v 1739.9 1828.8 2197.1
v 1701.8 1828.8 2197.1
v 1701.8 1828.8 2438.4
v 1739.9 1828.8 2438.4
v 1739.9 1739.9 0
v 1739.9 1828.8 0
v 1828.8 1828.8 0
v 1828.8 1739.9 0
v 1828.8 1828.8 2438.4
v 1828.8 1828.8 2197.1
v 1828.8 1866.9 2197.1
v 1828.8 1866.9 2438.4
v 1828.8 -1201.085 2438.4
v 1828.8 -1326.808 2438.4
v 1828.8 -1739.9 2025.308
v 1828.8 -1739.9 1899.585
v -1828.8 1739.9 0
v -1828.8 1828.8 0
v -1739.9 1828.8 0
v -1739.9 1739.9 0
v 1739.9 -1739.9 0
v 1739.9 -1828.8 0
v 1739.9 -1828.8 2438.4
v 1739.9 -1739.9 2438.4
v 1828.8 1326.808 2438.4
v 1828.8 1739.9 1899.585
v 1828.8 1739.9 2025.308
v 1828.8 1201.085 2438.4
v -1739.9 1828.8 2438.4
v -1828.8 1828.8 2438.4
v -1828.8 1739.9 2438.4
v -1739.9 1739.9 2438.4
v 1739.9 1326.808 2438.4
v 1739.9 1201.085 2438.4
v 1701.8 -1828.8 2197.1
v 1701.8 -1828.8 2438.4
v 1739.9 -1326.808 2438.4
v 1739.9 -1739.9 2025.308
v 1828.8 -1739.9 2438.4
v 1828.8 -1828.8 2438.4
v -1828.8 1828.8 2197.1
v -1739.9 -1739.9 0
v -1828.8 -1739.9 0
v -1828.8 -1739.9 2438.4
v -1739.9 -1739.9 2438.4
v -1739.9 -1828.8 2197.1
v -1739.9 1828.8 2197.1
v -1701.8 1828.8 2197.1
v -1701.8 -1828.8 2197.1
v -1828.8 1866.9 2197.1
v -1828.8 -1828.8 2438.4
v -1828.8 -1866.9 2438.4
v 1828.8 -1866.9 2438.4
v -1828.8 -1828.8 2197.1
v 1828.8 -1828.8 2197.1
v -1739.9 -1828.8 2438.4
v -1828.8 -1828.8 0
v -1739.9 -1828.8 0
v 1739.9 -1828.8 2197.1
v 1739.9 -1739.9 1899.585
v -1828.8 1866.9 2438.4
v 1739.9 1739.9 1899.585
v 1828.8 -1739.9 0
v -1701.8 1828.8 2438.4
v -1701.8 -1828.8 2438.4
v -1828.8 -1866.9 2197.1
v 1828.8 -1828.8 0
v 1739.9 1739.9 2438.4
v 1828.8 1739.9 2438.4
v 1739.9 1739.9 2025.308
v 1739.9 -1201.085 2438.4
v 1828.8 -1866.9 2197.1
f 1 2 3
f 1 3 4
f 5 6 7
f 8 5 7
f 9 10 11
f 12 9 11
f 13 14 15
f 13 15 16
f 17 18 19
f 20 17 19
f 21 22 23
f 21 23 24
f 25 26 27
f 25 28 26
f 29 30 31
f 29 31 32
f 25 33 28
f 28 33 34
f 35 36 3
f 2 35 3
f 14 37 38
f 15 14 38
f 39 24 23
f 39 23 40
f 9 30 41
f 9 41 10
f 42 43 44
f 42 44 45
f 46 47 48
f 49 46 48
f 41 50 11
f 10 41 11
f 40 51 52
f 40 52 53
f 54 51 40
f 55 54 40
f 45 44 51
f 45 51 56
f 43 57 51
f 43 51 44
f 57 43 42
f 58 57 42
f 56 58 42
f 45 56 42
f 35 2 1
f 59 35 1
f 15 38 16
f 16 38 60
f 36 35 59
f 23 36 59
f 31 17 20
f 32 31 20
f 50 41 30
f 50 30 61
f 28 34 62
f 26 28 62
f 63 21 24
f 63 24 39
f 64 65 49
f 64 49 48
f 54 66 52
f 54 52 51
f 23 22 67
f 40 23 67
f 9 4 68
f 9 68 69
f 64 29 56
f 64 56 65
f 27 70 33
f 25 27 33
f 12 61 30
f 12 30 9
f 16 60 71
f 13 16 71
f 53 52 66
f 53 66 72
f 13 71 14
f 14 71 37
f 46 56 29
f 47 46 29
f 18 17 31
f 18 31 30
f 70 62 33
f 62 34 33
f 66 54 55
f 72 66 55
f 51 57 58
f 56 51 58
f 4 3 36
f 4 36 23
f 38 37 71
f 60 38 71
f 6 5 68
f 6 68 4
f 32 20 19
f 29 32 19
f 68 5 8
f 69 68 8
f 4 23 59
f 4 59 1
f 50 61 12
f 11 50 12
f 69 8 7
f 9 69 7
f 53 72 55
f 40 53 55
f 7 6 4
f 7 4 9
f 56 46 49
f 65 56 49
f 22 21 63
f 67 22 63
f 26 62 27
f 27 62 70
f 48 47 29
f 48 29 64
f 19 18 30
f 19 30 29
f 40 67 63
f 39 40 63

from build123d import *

# Parameters (mm, degrees)
F0_W     = 88.9
F0_H     = 88.9
F1_DEPTH = 2438.4
F2_W     = 38.1
F2_H     = 3657.6
F3_DEPTH = 241.3
F4_W     = 3657.6
F4_H     = 38.1
F5_DEPTH = 241.3
F7_DEPTH = 88.9


with BuildPart() as f1:
    # F0 (on Top) → F1 (new body)
    with BuildSketch(Plane.XY):
        with Locations((-1784.35, 1784.35)):
            Rectangle(F0_W, F0_H)
    extrude(amount=F1_DEPTH)


with BuildPart() as f1b:
    # F0 (on Top) → F1, piece 2 (new body)
    with BuildSketch(Plane.XY):
        with Locations((1784.35, 1784.35)):
            Rectangle(F0_W, F0_H)
    extrude(amount=F1_DEPTH)


with BuildPart() as f1c:
    # F0 (on Top) → F1, piece 3 (new body)
    with BuildSketch(Plane.XY):
        with Locations((1784.35, -1784.35)):
            Rectangle(F0_W, F0_H)
    extrude(amount=F1_DEPTH)


with BuildPart() as f1d:
    # F0 (on Top) → F1, piece 4 (new body)
    with BuildSketch(Plane.XY):
        with Locations((-1784.35, -1784.35)):
            Rectangle(F0_W, F0_H)
    extrude(amount=F1_DEPTH)


with BuildPart() as f3:
    # F2 (on face) → F3 (new body)
    with BuildSketch(Plane.XY.offset(2438.4)):
        with Locations((-1720.85, 0)):
            Rectangle(F2_W, F2_H)
    extrude(amount=-F3_DEPTH)


with BuildPart() as f3b:
    # F2 (on face) → F3, piece 2 (new body)
    with BuildSketch(Plane.XY.offset(2438.4)):
        with Locations((1720.85, 0)):
            Rectangle(F2_W, F2_H)
    extrude(amount=-F3_DEPTH)


with BuildPart() as f5:
    # F4 (on face) → F5 (new body, through all)
    with BuildSketch(Plane.XY.offset(2438.4)):
        with Locations((0, -1847.85)):
            Rectangle(F4_W, F4_H)
    extrude(amount=-F5_DEPTH)


with BuildPart() as f5b:
    # F4 (on face) → F5, piece 2 (new body, through all)
    with BuildSketch(Plane.XY.offset(2438.4)):
        with Locations((0, 1847.85)):
            Rectangle(F4_W, F4_H)
    extrude(amount=-F5_DEPTH)


with BuildPart() as f7:
    # F6 (on face) → F7 (new body, through all)
    with BuildSketch(Plane.YZ.offset(1739.9)):
        Polygon((-1326.8082184308, 2438.4), (-1739.9, 2025.3082184308), (-1739.9, 1899.5846327359), (-1201.0846327359, 2438.4), align=None)
    extrude(amount=F7_DEPTH)


with BuildPart() as f7b:
    # F6 (on face) → F7, piece 2 (new body, through all)
    with BuildSketch(Plane.YZ.offset(1739.9)):
        Polygon((1739.9, 1899.5846327359), (1739.9, 2025.3082184308), (1326.8082184308, 2438.4), (1201.0846327359, 2438.4), align=None)
    extrude(amount=F7_DEPTH)


solid = Compound([f1.part, f1b.part, f1c.part, f1d.part, f3.part, f3b.part, f5.part, f5b.part, f7.part, f7b.part])
